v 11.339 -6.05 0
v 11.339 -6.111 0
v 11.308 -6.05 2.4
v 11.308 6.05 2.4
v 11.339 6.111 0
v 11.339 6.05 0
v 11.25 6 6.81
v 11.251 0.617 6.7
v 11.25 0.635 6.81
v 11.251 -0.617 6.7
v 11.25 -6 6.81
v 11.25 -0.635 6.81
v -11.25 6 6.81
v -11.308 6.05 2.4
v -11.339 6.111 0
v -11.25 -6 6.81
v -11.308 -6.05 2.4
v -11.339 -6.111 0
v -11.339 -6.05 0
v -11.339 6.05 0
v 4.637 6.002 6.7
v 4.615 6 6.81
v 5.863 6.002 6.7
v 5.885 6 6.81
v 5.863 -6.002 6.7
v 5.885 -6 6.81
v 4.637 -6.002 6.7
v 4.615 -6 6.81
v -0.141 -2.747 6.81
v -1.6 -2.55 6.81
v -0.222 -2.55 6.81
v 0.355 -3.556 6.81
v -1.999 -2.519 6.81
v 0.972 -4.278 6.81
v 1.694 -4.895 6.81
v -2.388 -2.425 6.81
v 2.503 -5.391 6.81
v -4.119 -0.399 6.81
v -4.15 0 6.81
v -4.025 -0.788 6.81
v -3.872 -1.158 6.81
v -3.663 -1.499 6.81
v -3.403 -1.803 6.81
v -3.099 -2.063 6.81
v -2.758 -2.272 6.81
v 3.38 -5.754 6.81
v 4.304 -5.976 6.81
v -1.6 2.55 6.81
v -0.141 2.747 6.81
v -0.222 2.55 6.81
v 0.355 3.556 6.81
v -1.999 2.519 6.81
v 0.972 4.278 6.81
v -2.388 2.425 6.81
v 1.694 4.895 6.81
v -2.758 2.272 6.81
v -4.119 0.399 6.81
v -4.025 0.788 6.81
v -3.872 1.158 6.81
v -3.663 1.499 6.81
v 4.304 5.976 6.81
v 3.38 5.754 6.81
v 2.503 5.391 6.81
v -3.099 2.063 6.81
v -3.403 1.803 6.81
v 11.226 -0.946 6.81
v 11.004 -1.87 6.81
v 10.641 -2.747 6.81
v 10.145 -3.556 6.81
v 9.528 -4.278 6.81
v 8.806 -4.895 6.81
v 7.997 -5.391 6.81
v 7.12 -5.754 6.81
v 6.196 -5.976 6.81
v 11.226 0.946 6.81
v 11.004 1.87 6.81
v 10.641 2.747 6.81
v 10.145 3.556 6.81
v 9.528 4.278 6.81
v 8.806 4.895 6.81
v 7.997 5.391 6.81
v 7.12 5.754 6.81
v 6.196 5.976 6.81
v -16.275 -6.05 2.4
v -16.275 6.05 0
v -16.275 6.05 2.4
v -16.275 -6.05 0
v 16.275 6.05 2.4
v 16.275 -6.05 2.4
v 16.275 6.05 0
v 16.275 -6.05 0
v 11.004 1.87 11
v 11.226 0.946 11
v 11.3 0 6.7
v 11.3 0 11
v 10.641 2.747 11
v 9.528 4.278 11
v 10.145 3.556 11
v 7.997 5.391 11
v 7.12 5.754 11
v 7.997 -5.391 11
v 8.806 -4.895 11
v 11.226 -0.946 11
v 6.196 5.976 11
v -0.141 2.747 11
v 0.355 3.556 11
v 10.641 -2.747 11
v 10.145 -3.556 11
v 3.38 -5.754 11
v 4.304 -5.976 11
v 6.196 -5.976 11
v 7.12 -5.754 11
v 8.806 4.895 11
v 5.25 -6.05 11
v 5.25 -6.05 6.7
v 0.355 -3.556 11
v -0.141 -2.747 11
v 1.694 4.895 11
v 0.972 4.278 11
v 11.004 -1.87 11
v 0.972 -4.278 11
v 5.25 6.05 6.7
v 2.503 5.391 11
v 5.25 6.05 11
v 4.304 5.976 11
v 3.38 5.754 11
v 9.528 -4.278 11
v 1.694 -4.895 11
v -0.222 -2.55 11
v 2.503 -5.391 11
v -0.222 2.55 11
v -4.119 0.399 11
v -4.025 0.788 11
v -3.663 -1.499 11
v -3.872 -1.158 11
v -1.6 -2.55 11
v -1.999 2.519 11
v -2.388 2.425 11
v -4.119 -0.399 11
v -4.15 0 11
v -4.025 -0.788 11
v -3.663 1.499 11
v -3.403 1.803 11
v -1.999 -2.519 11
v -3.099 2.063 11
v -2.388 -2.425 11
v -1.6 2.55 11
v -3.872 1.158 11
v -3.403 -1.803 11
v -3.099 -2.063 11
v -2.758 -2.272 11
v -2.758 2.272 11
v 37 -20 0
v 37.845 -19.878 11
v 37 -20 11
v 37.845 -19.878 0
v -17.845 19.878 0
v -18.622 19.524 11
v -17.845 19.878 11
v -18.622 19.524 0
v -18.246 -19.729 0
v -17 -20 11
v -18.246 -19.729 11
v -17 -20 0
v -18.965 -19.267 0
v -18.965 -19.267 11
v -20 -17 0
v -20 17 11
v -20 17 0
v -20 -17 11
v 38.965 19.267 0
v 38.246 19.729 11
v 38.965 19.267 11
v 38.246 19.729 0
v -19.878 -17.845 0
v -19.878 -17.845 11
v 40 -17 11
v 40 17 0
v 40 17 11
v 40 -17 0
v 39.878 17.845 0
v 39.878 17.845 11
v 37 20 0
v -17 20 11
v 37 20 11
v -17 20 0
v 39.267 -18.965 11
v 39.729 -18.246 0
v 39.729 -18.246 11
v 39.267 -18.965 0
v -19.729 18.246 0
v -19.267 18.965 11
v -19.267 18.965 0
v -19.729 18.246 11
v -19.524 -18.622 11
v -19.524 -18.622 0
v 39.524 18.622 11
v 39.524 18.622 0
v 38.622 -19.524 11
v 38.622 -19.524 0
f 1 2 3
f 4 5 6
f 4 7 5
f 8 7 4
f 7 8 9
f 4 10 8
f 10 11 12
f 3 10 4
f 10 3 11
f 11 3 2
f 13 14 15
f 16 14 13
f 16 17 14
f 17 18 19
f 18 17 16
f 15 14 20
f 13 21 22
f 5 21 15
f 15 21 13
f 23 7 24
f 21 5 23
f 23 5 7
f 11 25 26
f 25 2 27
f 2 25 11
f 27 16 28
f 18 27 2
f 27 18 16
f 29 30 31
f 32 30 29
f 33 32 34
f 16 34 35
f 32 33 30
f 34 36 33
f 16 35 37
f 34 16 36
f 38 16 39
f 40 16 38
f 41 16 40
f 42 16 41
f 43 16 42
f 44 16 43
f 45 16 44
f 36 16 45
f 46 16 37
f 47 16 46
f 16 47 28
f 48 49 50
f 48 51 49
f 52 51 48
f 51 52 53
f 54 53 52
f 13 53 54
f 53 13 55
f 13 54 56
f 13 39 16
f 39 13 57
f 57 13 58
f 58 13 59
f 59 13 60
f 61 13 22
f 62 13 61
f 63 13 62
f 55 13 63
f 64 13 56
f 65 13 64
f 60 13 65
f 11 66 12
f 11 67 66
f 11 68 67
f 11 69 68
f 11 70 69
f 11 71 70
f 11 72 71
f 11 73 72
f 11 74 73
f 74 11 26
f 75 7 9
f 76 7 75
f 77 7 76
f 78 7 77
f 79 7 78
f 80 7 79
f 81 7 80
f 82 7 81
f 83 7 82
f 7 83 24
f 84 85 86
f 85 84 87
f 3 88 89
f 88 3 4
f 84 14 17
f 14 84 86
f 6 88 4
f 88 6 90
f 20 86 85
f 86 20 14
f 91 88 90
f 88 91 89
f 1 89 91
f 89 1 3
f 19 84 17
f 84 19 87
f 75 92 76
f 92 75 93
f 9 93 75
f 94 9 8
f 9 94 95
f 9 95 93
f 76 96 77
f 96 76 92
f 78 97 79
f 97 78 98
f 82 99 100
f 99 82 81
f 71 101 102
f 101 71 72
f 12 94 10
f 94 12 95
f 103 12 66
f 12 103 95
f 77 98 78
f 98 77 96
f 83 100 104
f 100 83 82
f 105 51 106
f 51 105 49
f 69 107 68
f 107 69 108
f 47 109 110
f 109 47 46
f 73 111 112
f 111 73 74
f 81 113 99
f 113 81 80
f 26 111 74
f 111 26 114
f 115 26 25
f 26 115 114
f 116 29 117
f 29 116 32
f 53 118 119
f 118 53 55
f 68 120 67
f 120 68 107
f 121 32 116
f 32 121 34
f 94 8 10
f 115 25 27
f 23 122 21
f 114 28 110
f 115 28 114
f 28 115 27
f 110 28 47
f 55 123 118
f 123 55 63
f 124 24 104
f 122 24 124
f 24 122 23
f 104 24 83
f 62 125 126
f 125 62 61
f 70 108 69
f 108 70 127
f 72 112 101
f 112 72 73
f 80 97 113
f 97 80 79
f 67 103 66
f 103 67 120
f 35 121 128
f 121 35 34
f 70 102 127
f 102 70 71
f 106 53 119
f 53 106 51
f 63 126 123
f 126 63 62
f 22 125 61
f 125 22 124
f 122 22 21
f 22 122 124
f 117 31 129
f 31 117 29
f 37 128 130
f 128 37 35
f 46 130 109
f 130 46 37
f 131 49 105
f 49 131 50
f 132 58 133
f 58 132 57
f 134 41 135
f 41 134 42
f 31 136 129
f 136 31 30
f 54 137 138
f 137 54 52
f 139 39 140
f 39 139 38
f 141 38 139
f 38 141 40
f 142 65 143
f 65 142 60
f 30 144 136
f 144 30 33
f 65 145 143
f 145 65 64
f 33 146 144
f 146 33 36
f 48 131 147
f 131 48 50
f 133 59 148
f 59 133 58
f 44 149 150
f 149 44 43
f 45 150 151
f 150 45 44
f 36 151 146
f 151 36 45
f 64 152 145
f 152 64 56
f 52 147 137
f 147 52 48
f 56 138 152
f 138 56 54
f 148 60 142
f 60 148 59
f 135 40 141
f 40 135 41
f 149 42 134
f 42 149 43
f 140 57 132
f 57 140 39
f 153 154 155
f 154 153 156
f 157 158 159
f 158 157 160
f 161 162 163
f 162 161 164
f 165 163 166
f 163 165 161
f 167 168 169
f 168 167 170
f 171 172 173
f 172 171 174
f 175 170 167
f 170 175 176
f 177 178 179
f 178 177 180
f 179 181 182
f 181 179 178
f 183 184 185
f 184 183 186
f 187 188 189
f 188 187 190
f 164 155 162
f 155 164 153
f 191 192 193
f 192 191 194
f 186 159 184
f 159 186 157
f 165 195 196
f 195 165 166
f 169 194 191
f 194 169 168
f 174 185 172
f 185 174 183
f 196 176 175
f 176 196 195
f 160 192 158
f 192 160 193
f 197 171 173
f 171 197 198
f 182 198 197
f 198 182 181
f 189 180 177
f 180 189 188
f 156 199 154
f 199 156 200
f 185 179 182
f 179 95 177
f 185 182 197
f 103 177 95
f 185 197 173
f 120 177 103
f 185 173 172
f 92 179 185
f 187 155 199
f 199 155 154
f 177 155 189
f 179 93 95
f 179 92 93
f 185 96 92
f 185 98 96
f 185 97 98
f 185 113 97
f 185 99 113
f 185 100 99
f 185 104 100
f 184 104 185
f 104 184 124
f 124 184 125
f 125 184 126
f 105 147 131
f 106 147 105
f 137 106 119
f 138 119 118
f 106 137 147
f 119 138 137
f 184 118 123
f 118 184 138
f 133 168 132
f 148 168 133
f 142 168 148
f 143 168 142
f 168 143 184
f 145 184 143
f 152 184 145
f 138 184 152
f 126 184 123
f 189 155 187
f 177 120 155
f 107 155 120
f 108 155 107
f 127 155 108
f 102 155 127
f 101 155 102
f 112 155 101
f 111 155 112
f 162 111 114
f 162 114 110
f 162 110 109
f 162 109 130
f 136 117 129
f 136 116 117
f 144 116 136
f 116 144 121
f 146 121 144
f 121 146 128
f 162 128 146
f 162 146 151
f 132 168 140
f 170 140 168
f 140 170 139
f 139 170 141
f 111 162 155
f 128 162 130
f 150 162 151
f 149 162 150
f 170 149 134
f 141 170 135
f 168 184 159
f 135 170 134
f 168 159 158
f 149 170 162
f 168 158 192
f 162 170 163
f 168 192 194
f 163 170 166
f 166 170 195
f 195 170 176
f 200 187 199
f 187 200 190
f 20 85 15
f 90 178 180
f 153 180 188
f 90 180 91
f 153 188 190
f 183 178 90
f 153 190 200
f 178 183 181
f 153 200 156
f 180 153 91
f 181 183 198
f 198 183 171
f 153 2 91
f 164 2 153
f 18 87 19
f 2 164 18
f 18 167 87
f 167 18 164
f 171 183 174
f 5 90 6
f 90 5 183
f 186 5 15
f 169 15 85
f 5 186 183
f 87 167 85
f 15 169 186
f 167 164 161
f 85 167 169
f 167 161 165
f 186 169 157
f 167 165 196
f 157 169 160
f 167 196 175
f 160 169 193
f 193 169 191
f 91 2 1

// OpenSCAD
// file: arm1.scad
// armSingle for sg92r micro servo

//------------------------------------------
// arm1
module arm1(){
difference(){
    union(){
        // Boss
        cylinder(r=3.55,h=4.75,$fn=44);
        // arm
        hull(){
            translate([0,0,4.75-1.85])
            cylinder(r=3.2,h=1.85,$fn=22);

            translate([14,0,4.75-1.85])
            cylinder(r=3.9/2,h=1.85,$fn=22);
        }
    }

    // bottom cut
    cylinder(r=2.2,h=3.0,$fn=22);
    // thru cut
    cylinder(r=1.1,h=5,$fn=22);
    // top cut
    translate([0,0,4.75-1.0])
    cylinder(r=2.32,h=1,$fn=44);
    
    // holes in the arm
    for(i=[0:5])
    translate([4.7+i*9.75/5,0,4.75-1.85])
    cylinder(r=0.4,h=2,$fn=22);
}
} // ---------- end module arm1 -------

// arm1cut
module arm1cut(tol=0.1){
difference(){
    union(){
        // Boss
        cylinder(r=3.55+tol/2,h=4.75+tol,$fn=44);
        // arm
        hull(){
            translate([0,0,4.75-1.85])
            cylinder(r=3.2+tol/2,h=1.85+tol,$fn=22);

            translate([14,0,4.75-1.85])
            cylinder(r=3.9/2+tol,h=1.85,$fn=22);
        }
    }

    // bottom cut if needed
//    cylinder(r=2.2-tol/2,h=3.0-tol,$fn=22);
}
} // ---------- end module arm1cut -------

difference(){
arm1cut();
arm1();
}

translate([0,15,0])
arm1cut();
// file: servo1.scad
// Pan Tilt PiCamera for the Bots project

//-------------------------------------
module servo1 (){
// Servo body
hull(){
  linear_extrude(height=0.01)
  square([23,12.65],center=true);

  translate([0,0,22.9])
  linear_extrude(height=0.01)
  square([22.4,11.9],center=true);
}
// Tabs
difference(){
    translate([0,0,16])
    linear_extrude(height=2.5)
    square([32.45,12.0],center=true);
     
    translate([14,0,16])
    cylinder(h=3,r=1.25,$fn=22);
    translate([-14,0,16])
    cylinder(h=3,r=1.25,$fn=22);
}
// Collar
translate([5.25,0,22.8])
cylinder(h=4.5,r=6,$fn=40);
hull(){
    translate([-1.6,0,22.8])
    cylinder(h=4.5,r=2.5,$fn=40);
    translate([2,0,22.8])
    cylinder(h=4.5,r=2.5,$fn=40);
}
// Shaft
color("red")
translate([5.25,0,0])
cylinder(h=30.3,r=2.3,$fn=40);

// Wires
color("red")
translate([10,1.3,4.8])
rotate([0,90,0])
cylinder(h=6,r=1.3/2,$fn=22);
color("orange")
translate([10,0,4.8])
rotate([0,90,0])
cylinder(h=6,r=1.3/2,$fn=22);
color("brown")
translate([6,-1.3,4.8])
rotate([0,90,0])
cylinder(h=10,r=1.3/2,$fn=22);

} // --------- end module servo1 -------

module servo1cut (tol=0.1){
// Servo body
hull(){
  linear_extrude(height=0.01)
  square([23+tol,12.65+tol],center=true);

  translate([0,0,22.9+tol])
  linear_extrude(height=0.01)
  square([22.4+tol,11.9+tol],center=true);
}
// Tabs
difference(){
    translate([0,0,16-tol])
    linear_extrude(height=2.5+2*tol)
    square([32.45+tol,12.0+tol],center=true);
}

// Collar
translate([5.25,0,22.8+tol])
cylinder(h=4.5+tol,r=6+tol/2,$fn=40);
hull(){
    translate([-1.6,0,22.8])
    cylinder(h=4.5+tol/2,r=2.5+tol/2,$fn=40);
    translate([2,0,22.8])
    cylinder(h=4.5+tol/2,r=2.5+tol/2,$fn=40);
}
// Shaft
color("red")
translate([5.25,0,0])
cylinder(h=30.3+tol,r=2.3+tol/2,$fn=40);

// Wires
hull(){
    color("red")
    translate([10,1.3,4.8])
    rotate([0,90,0])
    cylinder(h=6,r=1.3/2+tol,$fn=22);
    color("brown")
    translate([6,-1.3,4.8])
    rotate([0,90,0])
    cylinder(h=10,r=1.3/2+tol,$fn=22);
}
} // --------- end module servo1cut -------

difference(){
servo1cut();
servo1();
}

//translate([0,30,0])
//servo1cut();
// main file
// Base part
use <servo1.scad>
use <arm1.scad>

//----------------------------
module base1(){
difference(){
    // boss
    translate([10,0,0])
    linear_extrude(height=11)
    offset(r=3,$fn=22)
    square([60-6,40-6],center=true);

    // servocut
    translate([0,0,-16.2])
    servo1cut();
}
} //-------- end module base1 -------------

color("cyan")
base1();

/*
// show how servo would fit
translate([0,0,-16.2])
servo1();
*/
